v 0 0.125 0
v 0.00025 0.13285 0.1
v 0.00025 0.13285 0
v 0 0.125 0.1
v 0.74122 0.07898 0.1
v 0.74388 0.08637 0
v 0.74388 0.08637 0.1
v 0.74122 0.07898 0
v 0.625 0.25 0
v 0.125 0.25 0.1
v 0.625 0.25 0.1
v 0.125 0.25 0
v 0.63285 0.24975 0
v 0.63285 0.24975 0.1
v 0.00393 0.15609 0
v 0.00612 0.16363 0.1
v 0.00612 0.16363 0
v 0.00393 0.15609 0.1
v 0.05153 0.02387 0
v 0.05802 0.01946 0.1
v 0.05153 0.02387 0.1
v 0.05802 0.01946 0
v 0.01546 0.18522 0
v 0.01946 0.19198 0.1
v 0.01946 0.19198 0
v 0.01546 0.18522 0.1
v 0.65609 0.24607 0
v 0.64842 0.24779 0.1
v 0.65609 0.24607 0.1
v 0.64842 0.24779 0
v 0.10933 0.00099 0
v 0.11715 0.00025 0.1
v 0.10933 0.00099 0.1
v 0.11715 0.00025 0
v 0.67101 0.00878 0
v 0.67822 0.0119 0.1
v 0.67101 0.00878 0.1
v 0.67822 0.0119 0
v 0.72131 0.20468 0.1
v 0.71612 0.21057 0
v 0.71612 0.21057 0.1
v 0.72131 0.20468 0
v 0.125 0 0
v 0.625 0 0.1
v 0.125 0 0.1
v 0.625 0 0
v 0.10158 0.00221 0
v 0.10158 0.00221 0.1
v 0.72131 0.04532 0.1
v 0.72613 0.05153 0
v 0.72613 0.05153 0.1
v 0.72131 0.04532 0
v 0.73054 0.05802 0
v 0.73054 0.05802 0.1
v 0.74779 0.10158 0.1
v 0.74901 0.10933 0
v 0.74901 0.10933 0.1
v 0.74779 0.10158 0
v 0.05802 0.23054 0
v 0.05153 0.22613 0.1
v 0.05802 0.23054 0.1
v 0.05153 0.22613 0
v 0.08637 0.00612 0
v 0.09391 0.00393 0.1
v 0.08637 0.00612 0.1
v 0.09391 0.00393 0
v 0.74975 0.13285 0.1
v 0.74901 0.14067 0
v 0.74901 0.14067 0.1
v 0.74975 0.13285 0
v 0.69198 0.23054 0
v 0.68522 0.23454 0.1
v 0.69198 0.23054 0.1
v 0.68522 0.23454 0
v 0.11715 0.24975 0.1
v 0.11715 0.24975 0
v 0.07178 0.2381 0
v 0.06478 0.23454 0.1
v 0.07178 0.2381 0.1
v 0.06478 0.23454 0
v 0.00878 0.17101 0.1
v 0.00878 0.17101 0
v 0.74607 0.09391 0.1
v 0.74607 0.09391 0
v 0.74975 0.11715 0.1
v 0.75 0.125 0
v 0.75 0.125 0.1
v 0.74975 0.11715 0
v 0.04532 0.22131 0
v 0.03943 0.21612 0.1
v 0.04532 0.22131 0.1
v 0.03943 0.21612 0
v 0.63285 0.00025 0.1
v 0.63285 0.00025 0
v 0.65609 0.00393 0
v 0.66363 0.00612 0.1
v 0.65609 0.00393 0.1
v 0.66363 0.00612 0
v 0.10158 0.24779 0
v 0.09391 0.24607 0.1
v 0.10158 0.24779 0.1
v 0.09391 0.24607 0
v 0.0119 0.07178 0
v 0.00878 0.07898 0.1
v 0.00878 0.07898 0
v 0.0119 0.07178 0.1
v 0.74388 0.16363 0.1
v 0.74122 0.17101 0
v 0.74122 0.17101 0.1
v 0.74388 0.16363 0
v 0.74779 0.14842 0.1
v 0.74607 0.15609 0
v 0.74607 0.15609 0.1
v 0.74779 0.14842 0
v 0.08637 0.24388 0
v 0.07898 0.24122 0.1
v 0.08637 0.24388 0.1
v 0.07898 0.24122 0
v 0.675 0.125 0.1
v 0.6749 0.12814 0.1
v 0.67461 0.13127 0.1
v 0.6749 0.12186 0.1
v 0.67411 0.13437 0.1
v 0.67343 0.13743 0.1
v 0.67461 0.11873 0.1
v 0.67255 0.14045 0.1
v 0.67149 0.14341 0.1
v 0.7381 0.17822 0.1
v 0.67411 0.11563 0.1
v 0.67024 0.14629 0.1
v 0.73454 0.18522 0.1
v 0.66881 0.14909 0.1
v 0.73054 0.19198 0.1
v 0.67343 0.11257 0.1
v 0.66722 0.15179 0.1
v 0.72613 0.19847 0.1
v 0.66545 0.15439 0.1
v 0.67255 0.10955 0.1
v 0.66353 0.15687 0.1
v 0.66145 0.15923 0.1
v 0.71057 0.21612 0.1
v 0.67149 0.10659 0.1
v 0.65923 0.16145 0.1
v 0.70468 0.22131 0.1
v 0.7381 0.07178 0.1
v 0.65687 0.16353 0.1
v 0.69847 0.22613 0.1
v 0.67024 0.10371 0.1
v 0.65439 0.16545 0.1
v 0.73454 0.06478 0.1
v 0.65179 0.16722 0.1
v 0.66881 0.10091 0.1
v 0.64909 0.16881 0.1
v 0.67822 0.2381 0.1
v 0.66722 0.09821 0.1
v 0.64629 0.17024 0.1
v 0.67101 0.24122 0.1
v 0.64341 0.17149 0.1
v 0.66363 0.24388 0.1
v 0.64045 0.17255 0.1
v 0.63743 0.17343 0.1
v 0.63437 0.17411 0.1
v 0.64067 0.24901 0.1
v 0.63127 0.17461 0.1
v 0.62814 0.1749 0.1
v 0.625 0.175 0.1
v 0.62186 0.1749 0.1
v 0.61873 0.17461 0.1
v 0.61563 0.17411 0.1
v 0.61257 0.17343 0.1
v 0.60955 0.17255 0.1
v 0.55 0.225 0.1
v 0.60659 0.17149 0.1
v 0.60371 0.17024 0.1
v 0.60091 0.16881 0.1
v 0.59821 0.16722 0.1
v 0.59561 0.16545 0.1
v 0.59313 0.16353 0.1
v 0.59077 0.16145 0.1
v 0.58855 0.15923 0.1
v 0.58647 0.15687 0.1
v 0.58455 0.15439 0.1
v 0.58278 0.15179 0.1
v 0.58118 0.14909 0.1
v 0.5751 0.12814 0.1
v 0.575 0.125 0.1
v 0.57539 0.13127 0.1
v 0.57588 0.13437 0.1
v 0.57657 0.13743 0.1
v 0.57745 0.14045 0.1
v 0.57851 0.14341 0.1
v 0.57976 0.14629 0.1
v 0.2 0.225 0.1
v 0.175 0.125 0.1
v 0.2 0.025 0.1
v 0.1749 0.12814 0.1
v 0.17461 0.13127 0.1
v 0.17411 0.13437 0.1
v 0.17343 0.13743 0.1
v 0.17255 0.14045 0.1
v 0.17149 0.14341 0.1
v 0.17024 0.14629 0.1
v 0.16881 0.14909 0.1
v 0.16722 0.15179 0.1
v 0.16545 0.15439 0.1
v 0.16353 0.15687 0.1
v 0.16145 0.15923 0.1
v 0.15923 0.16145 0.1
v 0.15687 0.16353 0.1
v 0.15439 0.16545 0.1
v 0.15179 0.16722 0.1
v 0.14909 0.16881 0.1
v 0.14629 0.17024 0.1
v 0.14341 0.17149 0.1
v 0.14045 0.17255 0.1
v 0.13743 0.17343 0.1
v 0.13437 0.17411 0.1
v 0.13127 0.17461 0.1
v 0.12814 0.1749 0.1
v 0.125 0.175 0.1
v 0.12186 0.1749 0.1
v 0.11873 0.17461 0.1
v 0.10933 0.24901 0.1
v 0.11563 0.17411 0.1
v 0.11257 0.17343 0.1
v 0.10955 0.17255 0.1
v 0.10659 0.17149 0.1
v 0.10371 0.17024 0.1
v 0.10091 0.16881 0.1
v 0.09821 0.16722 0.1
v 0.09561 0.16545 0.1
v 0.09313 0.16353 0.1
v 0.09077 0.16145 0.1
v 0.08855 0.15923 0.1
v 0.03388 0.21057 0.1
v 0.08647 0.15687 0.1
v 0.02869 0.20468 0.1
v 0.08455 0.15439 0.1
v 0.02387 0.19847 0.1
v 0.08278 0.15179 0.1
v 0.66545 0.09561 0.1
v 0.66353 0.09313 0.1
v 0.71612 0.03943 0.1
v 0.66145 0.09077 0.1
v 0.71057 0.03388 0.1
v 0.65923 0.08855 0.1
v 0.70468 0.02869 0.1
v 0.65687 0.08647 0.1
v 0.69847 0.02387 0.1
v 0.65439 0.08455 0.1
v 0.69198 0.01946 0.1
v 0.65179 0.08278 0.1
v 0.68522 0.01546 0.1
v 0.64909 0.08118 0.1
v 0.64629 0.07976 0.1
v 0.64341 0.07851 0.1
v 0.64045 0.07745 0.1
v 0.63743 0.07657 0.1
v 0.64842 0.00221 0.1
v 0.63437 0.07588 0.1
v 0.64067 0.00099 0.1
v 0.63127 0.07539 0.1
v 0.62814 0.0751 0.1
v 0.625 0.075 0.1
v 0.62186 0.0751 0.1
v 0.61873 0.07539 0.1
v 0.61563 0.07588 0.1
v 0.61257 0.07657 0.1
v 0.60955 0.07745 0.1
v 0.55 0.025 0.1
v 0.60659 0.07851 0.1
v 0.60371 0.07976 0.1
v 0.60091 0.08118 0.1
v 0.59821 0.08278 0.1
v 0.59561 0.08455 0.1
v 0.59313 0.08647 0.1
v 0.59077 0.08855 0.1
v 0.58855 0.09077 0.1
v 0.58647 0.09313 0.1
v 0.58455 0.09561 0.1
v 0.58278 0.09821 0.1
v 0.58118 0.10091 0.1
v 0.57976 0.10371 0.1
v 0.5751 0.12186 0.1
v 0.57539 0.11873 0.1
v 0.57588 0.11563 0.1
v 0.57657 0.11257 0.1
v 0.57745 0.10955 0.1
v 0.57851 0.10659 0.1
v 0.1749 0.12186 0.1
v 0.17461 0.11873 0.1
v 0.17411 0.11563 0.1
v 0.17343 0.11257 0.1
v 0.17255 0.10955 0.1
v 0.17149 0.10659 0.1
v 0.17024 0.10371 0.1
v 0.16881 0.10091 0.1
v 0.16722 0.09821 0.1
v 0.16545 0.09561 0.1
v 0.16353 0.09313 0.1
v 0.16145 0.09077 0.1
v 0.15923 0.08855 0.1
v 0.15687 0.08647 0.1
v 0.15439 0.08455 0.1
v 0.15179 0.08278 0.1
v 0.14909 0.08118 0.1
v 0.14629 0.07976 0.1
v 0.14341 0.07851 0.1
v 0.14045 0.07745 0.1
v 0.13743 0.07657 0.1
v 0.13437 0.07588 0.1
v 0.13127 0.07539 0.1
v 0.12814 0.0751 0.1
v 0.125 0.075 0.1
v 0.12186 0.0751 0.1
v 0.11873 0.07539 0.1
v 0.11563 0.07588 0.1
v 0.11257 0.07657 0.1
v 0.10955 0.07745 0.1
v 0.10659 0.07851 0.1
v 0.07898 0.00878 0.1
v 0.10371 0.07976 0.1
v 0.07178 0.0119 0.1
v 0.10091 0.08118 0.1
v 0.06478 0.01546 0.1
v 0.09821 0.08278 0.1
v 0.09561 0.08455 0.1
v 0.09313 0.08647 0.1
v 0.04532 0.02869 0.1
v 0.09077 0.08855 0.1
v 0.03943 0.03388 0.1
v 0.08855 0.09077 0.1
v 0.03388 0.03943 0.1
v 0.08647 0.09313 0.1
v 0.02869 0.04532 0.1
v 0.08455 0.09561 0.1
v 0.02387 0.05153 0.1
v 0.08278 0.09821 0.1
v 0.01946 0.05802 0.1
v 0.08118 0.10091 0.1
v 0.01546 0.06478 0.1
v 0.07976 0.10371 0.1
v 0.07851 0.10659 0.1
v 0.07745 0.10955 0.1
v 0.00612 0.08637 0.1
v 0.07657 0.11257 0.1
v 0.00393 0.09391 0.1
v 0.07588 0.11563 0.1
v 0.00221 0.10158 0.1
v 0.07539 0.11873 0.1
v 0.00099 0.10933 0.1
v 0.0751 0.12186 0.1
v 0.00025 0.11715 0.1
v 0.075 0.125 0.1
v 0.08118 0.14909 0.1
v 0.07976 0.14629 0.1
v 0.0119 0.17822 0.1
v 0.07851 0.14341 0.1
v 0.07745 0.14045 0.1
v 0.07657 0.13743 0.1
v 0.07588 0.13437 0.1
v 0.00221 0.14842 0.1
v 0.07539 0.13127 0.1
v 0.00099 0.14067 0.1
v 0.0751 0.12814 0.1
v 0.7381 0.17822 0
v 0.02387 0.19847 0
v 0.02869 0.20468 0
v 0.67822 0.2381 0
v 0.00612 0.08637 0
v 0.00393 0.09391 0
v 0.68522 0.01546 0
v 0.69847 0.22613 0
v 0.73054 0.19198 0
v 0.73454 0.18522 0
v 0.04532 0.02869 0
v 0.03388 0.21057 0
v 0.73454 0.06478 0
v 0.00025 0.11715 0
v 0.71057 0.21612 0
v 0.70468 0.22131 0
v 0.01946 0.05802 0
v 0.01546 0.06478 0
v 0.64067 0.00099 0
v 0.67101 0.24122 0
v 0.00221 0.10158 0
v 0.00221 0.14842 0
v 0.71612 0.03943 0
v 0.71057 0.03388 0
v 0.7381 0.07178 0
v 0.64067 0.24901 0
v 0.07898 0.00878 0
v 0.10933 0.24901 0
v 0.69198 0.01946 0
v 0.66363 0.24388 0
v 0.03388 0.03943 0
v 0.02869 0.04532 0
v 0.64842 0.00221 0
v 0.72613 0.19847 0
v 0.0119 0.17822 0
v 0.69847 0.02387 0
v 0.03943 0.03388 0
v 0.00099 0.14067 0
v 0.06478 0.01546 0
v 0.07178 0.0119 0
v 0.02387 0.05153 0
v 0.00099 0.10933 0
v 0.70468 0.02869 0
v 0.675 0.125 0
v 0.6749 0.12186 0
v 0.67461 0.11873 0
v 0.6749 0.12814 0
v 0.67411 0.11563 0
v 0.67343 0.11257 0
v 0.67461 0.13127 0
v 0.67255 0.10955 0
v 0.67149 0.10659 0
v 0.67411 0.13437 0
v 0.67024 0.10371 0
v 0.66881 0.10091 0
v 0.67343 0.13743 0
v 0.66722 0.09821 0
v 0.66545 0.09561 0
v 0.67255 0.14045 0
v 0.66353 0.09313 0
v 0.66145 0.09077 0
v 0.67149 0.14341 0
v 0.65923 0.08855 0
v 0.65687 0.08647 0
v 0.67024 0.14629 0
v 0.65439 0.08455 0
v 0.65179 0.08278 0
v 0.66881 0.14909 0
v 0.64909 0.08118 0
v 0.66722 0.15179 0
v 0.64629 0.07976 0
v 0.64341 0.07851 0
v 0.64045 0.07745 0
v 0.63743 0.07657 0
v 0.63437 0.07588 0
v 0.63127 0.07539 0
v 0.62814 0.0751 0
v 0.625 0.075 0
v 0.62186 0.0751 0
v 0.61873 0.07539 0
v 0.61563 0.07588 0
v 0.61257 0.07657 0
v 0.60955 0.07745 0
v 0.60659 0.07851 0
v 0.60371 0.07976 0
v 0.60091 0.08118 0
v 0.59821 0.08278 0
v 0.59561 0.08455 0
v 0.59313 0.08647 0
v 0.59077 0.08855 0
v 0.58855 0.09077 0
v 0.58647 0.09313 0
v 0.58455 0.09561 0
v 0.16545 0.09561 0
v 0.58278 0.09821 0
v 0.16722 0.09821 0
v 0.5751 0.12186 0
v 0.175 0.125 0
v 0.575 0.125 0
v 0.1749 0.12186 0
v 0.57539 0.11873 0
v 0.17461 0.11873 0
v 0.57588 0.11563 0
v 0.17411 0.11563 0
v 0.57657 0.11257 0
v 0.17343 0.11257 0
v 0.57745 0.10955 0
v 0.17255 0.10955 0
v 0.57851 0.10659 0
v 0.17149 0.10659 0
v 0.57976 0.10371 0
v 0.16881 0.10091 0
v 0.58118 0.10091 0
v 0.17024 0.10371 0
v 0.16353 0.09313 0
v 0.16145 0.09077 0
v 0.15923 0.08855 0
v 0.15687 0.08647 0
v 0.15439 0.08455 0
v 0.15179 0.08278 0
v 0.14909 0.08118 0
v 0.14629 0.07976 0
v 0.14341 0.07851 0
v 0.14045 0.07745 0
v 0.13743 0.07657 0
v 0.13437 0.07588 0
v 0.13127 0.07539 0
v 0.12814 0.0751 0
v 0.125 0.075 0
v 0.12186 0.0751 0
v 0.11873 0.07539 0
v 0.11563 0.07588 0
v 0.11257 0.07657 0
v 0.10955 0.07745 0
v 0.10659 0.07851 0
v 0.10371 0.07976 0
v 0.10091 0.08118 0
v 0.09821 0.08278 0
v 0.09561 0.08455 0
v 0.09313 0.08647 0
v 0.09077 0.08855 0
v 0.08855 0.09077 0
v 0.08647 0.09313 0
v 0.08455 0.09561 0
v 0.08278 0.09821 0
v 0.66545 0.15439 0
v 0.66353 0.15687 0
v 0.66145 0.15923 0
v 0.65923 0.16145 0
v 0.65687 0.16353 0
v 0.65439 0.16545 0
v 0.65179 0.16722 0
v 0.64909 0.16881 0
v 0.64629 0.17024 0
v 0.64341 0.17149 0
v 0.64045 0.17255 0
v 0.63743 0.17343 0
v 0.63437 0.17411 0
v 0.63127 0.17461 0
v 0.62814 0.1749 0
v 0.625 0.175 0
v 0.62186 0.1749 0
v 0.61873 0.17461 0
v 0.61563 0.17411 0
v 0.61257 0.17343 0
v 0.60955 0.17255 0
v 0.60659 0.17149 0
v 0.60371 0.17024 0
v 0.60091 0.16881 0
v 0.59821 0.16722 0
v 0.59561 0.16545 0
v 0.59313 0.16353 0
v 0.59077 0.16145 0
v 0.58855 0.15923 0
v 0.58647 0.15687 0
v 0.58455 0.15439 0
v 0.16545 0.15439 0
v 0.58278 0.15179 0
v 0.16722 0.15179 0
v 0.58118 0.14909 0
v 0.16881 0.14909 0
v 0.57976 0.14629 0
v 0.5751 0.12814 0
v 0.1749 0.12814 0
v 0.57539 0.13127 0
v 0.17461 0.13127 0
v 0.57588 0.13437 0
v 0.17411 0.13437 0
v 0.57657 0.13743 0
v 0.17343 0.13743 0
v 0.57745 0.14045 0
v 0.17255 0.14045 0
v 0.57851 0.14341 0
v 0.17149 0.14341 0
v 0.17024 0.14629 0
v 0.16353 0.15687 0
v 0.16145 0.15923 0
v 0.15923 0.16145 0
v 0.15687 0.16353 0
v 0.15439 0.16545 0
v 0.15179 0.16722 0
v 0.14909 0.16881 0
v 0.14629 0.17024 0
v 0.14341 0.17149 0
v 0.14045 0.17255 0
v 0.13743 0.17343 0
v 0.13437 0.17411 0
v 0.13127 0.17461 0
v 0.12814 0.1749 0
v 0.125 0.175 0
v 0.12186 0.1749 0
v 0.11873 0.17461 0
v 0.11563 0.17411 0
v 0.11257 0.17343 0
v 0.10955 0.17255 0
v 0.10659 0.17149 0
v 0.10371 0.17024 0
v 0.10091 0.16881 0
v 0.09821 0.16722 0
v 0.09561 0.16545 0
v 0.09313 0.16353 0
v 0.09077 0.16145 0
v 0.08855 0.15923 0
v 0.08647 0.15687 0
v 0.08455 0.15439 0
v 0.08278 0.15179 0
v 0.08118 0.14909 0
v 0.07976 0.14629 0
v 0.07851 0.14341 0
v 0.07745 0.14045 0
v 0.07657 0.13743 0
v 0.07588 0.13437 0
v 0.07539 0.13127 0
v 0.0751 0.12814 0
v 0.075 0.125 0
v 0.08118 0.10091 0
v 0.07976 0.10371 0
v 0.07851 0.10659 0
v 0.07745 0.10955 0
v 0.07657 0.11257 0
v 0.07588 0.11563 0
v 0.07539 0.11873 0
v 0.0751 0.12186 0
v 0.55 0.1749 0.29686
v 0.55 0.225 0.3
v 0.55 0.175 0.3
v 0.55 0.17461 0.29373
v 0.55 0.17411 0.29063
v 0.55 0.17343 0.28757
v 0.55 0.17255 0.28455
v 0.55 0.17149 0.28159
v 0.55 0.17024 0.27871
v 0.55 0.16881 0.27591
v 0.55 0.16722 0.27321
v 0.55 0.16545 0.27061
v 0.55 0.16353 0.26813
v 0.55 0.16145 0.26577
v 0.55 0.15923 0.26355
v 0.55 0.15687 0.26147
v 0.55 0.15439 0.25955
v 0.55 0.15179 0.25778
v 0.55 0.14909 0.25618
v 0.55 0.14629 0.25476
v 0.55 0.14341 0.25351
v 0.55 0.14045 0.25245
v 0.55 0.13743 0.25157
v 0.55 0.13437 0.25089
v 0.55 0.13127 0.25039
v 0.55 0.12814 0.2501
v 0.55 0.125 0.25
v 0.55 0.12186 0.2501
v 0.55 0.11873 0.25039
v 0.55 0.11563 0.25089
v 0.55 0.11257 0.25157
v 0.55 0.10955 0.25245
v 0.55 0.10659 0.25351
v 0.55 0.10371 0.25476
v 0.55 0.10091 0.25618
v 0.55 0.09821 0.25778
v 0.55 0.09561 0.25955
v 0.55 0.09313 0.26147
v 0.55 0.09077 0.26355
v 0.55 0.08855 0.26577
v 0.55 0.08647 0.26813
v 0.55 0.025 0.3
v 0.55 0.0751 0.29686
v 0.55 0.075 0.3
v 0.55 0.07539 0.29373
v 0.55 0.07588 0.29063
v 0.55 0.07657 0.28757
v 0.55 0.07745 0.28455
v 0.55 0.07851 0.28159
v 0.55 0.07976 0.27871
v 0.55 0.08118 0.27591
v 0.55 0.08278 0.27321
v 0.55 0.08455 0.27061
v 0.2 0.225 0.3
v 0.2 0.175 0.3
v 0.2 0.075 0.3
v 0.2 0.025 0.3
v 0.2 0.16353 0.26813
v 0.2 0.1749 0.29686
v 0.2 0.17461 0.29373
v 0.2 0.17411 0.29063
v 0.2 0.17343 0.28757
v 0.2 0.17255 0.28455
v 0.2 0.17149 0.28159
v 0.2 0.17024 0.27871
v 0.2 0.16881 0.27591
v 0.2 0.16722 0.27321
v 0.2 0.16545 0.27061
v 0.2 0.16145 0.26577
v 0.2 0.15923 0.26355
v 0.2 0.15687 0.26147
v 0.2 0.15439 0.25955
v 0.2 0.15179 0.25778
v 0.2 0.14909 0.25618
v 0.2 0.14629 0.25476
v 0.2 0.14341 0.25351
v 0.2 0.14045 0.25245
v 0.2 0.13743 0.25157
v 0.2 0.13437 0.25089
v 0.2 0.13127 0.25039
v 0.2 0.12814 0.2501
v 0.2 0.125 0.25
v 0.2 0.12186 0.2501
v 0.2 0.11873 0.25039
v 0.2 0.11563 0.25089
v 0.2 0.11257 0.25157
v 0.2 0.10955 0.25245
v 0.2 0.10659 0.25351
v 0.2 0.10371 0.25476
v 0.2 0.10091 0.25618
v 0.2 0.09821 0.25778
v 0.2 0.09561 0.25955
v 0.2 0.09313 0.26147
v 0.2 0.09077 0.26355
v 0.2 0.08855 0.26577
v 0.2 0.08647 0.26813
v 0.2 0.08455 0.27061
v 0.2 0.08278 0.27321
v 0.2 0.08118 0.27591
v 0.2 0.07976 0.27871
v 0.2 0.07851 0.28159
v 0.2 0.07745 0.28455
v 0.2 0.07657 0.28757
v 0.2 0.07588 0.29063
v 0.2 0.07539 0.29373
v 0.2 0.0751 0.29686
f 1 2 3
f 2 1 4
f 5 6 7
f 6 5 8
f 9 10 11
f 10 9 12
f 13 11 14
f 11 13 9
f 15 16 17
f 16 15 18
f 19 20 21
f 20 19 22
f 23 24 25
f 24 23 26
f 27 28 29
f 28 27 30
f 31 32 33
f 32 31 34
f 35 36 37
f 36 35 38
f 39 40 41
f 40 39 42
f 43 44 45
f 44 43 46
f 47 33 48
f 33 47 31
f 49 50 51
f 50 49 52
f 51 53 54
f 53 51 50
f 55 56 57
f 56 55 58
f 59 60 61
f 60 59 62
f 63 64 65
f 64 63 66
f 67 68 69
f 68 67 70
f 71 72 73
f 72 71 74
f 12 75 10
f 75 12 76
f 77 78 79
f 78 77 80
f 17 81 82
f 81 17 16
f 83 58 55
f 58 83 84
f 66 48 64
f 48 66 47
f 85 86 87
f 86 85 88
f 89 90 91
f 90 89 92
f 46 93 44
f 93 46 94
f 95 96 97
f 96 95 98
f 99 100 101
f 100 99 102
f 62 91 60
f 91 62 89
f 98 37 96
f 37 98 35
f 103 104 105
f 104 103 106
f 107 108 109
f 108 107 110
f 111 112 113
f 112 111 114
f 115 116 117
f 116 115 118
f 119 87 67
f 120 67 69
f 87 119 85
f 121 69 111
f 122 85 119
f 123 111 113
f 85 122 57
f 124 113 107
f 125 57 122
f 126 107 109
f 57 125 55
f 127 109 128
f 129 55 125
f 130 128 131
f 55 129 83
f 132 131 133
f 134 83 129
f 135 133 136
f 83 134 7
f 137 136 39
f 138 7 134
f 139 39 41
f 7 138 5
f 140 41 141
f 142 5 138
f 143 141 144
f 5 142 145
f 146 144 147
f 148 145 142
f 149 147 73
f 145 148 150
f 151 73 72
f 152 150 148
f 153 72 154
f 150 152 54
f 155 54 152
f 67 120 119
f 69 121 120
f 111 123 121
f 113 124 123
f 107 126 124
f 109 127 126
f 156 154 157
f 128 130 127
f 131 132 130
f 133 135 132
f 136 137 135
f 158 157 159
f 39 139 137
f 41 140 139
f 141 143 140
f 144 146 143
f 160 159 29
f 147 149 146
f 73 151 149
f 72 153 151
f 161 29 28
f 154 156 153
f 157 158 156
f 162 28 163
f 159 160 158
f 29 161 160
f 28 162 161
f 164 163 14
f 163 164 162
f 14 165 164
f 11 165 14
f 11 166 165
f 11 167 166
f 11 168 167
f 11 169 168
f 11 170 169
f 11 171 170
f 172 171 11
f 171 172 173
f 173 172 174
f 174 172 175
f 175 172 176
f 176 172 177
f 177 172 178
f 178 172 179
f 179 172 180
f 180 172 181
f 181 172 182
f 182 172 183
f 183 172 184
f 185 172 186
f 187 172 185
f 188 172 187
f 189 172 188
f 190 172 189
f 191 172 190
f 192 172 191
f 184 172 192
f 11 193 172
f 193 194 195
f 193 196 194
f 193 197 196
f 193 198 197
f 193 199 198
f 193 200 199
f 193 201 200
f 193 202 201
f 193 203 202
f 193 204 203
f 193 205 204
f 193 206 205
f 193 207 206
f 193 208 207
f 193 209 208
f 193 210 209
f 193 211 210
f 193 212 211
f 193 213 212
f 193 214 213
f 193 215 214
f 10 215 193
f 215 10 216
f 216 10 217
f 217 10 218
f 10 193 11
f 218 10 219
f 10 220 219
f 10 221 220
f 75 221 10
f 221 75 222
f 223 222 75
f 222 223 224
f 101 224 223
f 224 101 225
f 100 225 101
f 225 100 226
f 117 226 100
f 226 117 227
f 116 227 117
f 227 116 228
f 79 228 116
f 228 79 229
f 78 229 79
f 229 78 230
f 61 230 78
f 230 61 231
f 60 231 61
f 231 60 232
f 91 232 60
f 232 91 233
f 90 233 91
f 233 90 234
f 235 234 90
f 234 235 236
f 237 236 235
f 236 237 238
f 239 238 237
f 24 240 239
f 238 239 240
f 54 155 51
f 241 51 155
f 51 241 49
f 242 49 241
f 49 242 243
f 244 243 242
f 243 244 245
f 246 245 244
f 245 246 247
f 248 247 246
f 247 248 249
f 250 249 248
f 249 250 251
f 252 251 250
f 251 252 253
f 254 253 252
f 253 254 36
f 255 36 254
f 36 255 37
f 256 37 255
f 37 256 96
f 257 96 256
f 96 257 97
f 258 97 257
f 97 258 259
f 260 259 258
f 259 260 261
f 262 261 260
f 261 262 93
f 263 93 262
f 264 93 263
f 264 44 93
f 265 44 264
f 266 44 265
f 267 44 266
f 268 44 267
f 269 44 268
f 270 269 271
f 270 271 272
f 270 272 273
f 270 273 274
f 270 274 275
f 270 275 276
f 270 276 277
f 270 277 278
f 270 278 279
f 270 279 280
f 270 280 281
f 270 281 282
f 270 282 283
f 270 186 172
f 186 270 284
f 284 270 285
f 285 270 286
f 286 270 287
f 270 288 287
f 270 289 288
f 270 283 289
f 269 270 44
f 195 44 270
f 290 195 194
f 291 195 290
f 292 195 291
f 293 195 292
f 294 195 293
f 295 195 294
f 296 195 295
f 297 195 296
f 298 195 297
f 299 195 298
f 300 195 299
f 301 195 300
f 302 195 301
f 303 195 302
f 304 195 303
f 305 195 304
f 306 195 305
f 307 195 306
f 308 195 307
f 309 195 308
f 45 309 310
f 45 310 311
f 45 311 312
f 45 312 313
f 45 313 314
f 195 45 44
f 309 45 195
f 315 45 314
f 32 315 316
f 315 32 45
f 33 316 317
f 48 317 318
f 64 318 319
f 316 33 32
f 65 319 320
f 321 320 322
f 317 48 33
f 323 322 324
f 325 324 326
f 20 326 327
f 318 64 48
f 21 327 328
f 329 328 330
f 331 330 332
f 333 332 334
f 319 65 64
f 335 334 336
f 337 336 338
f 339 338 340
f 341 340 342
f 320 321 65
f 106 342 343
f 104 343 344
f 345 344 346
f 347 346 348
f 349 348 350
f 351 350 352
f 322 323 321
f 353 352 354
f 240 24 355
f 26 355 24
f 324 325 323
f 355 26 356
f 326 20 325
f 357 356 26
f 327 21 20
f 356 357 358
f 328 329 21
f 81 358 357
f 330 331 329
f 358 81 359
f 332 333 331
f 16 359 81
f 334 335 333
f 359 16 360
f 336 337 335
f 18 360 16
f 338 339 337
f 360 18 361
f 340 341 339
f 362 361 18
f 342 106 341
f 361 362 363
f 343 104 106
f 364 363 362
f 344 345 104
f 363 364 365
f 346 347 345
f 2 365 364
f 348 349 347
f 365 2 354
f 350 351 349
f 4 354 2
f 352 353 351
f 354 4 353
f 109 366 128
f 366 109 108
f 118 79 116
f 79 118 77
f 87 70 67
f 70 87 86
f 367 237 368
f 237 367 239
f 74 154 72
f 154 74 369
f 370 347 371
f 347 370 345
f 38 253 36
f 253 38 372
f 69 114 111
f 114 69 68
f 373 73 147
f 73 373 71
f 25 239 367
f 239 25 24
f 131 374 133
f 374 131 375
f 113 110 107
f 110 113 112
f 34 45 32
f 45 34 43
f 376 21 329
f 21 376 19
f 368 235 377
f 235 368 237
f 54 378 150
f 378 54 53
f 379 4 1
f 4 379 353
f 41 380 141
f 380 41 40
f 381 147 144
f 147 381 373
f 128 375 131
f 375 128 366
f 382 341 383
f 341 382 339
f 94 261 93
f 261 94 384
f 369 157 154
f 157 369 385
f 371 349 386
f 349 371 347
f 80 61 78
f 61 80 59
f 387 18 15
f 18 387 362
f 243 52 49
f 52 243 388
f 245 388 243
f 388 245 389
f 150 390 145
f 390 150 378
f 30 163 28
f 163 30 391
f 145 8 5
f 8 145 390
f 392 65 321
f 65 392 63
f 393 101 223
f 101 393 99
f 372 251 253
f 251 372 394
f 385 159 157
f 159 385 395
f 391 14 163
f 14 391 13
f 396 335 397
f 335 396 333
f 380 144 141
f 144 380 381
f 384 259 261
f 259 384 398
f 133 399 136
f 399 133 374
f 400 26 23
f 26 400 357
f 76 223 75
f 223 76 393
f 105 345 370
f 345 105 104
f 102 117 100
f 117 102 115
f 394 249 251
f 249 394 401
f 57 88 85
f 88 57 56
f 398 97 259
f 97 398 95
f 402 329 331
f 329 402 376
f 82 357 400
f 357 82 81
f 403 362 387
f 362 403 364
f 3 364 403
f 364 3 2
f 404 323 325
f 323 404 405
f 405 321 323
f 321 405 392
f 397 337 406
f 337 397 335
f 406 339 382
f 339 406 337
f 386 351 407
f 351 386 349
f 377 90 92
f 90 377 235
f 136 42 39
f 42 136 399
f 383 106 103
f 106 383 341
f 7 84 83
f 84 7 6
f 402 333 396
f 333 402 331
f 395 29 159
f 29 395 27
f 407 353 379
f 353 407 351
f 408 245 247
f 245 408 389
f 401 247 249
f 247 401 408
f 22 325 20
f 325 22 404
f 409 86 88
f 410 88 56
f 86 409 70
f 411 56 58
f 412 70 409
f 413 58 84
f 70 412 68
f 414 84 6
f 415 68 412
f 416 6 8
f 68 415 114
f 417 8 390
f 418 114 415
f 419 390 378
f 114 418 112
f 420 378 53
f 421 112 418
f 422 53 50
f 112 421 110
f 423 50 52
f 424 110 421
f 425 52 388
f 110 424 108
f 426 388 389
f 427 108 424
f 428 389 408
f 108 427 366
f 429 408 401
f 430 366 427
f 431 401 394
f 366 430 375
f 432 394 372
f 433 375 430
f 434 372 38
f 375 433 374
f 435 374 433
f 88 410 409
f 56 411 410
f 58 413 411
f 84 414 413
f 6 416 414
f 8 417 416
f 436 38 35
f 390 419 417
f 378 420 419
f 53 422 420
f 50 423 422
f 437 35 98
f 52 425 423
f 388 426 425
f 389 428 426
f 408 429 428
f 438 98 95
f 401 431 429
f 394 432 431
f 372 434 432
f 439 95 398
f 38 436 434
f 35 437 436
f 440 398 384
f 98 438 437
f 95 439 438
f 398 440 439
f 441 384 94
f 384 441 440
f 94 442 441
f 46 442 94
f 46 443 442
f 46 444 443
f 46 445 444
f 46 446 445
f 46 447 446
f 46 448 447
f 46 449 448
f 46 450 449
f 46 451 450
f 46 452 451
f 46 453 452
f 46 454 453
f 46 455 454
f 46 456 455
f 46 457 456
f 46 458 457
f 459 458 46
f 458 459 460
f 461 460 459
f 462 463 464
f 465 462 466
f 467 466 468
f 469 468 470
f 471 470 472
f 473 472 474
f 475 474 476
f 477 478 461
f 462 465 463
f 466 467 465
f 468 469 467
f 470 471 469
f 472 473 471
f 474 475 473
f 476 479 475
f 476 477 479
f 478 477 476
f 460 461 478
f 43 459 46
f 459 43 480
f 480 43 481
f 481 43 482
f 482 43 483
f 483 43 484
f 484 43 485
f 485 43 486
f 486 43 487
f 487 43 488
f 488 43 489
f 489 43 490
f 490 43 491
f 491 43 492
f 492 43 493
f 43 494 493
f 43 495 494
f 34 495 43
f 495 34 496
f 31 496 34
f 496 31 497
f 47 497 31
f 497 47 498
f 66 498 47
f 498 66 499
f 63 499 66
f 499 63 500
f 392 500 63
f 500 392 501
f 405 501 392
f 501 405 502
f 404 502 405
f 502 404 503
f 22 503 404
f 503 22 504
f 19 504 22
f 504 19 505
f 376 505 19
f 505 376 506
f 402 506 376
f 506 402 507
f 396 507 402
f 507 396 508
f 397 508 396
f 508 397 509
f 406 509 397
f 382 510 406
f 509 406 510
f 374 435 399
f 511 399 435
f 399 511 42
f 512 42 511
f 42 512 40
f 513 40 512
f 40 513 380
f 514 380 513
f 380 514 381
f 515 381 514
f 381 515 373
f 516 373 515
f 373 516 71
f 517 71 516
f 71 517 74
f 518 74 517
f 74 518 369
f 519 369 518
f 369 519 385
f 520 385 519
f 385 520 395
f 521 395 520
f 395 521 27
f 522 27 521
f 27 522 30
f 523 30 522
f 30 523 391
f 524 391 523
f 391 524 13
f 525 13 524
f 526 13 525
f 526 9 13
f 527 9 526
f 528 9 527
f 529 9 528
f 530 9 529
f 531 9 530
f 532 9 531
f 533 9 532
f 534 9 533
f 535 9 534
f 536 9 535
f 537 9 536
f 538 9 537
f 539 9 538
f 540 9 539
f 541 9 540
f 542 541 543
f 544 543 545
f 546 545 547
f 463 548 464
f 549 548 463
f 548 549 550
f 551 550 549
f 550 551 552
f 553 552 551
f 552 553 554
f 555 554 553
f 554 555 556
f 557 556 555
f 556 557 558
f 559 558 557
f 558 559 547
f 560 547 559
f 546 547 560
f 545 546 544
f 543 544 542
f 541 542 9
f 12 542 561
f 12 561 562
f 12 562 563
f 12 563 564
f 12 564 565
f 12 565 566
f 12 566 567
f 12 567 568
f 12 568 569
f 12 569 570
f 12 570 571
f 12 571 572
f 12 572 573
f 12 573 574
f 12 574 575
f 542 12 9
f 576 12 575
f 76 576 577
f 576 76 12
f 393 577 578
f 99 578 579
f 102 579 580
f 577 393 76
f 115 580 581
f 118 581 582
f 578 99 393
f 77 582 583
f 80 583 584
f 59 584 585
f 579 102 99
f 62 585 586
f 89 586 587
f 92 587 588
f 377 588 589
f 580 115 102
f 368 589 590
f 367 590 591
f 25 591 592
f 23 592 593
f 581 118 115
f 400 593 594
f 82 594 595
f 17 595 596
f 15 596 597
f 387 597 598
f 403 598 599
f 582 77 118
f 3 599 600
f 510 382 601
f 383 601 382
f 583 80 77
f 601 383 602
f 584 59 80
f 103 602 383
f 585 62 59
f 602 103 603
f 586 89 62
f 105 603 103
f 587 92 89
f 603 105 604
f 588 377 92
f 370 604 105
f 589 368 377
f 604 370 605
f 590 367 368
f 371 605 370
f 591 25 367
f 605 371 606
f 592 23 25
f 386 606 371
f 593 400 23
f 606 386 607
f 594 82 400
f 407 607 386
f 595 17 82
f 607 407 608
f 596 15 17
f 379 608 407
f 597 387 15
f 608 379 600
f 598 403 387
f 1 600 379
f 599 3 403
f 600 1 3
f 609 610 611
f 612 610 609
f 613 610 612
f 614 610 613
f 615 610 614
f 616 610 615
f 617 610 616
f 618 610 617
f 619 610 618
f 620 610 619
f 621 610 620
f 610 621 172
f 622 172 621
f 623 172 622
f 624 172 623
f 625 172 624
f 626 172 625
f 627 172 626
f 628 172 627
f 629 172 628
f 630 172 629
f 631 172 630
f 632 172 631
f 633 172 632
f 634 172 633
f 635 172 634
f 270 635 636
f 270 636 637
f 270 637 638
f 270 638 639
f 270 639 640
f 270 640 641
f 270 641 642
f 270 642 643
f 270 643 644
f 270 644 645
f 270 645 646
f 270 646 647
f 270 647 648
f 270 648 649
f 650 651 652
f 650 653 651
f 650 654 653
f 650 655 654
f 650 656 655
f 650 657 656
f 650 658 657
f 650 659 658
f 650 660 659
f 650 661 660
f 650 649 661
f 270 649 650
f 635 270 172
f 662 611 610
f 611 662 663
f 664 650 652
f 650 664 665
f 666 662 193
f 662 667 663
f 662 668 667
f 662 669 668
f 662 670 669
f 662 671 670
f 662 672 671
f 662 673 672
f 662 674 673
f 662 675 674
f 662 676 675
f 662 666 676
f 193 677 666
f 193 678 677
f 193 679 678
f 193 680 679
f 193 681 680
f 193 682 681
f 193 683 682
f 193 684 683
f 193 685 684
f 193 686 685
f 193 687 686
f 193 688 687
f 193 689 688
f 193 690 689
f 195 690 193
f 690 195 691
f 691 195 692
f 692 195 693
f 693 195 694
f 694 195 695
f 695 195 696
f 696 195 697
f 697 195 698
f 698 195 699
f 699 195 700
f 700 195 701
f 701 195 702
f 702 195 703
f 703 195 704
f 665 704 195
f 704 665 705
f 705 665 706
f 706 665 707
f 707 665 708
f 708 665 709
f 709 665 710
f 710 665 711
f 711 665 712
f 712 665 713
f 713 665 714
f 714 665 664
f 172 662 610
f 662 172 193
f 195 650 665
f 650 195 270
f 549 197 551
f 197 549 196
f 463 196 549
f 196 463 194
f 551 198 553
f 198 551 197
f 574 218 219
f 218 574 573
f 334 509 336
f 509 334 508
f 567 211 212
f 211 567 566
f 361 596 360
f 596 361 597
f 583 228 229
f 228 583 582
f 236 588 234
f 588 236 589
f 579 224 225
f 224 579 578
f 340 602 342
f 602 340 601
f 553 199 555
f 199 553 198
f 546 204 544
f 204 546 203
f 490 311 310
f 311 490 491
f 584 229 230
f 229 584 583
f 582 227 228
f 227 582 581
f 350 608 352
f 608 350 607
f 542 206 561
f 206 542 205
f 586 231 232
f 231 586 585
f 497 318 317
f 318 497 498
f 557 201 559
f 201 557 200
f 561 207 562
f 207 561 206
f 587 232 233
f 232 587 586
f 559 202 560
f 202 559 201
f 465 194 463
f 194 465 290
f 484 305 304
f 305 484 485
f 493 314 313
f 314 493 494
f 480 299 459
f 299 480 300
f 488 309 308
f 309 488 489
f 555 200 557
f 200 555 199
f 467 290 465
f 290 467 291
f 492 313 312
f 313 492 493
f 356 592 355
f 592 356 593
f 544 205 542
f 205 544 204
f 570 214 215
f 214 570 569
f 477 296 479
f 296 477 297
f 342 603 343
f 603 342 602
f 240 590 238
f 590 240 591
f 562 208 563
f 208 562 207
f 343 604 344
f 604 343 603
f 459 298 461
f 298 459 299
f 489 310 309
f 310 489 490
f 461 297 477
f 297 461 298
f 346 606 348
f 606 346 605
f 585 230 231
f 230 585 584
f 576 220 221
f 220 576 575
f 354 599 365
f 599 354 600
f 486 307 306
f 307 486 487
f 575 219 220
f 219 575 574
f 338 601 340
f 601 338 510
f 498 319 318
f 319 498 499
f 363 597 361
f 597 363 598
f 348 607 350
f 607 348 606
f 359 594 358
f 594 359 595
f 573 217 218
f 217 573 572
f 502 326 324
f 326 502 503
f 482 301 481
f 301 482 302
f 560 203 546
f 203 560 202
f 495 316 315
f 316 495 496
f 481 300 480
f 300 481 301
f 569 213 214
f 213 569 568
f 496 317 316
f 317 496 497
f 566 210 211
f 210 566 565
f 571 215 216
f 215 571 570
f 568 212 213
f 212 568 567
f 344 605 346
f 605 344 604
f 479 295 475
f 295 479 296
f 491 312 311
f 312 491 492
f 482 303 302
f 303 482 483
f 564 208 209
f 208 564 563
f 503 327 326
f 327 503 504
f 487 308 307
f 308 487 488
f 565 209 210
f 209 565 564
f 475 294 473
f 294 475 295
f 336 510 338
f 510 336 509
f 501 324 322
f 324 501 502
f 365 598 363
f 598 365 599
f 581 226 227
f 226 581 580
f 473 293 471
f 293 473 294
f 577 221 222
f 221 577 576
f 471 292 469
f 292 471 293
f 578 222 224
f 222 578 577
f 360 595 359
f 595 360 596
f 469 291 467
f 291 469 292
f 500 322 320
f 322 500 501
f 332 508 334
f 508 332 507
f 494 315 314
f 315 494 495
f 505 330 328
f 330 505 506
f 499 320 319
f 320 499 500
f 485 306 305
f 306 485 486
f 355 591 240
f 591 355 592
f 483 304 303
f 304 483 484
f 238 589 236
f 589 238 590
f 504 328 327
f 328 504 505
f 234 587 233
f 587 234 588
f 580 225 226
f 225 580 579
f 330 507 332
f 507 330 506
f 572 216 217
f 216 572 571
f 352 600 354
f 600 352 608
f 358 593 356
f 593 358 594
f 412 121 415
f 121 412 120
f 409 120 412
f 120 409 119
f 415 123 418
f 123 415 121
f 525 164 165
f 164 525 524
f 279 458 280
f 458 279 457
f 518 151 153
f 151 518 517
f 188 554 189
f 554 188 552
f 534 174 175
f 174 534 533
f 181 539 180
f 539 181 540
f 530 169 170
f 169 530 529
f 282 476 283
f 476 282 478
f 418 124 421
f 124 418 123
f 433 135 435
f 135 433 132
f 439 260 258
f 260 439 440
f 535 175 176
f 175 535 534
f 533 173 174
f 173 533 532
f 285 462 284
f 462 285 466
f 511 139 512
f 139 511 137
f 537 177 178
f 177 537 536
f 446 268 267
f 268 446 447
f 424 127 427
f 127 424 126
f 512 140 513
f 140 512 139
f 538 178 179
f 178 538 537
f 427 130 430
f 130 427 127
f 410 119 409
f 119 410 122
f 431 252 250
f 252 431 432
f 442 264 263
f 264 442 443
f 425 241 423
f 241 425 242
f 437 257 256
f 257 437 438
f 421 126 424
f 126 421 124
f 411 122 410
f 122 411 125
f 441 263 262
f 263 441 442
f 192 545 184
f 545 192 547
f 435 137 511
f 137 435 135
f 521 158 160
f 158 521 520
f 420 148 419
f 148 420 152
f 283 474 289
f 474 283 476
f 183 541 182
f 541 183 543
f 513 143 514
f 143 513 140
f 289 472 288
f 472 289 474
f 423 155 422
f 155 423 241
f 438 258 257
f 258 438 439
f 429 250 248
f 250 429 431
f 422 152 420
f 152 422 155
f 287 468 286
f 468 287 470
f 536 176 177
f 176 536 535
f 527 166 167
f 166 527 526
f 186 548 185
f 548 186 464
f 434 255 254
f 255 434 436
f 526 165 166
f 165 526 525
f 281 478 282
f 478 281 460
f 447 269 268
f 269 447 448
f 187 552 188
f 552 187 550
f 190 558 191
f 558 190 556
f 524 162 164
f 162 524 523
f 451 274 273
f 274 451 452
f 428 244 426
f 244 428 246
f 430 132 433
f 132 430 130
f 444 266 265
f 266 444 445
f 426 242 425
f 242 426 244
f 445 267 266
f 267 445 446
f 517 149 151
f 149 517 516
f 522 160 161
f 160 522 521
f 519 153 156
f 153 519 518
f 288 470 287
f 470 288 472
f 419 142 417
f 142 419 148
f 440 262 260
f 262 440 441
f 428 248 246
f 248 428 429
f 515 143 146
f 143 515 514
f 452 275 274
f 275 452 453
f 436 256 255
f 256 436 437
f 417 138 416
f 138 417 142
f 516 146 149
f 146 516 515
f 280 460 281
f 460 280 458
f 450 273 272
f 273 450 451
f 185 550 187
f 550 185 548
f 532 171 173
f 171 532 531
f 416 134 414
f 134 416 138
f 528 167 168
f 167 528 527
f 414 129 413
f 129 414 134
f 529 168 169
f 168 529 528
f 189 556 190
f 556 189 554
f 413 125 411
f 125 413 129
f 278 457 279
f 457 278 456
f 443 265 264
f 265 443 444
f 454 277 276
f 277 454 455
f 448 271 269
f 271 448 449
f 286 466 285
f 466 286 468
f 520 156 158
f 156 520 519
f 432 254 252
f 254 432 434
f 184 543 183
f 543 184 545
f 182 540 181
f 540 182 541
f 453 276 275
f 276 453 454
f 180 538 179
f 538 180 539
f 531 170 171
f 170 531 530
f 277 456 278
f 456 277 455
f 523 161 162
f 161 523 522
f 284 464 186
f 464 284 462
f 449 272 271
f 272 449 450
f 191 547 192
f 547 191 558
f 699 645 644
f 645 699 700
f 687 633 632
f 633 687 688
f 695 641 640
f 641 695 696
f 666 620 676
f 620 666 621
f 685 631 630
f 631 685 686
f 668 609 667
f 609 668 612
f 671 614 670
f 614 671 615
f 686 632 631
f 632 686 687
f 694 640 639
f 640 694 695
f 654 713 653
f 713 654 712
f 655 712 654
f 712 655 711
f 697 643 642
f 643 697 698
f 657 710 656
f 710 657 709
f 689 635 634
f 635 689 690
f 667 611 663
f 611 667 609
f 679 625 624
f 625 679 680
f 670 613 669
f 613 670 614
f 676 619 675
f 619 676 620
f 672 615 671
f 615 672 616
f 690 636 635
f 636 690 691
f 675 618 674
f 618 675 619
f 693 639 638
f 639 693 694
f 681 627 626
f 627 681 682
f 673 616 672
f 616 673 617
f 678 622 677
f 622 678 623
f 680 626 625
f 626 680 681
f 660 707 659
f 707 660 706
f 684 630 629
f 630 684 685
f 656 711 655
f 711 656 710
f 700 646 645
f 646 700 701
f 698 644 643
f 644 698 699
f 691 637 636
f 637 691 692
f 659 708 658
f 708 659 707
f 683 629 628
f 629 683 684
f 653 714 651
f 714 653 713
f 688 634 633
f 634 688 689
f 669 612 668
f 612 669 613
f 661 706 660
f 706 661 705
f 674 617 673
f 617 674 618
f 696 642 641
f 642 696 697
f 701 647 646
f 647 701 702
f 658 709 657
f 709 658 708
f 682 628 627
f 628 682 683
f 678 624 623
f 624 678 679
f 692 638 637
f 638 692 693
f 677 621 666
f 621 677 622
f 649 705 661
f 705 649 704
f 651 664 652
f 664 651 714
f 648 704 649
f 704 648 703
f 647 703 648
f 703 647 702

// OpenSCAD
// === Main Base Obround Slab Parameters ===
base_length = 0.75;
base_width = 0.25;
base_height = 0.1;

// === Through-Hole Parameters ===
hole_radius = 0.05;
hole_y = 0.125;           // from front edge
hole_x1 = 0.125;          // first hole from left edge
hole_x2 = 0.625;          // second hole from left edge

// === Lower Upright Parameters ===
upright_length = 0.35;
upright_width = 0.2;
upright_height = 0.2;
upright_x_offset = 0.2;   // from both length ends
upright_y_offset = 0.025; // from both front/back edges

// === Rounded Cap Parameters ===
cap_radius = 0.1;          // semicircular profile radius (width/2)
cap_rise = 0.1;            // rise above upright top
crown_height = 0.4;        // crown above base underside

// === Horizontal Passage Parameters ===
passage_radius = 0.05;
passage_y = 0.125;         // center from front edge
passage_z_min = 0.25;
passage_z_max = 0.35;
passage_x_start = 0.2;     // starts at upright left face
passage_reach = 0.444;     // reach along length direction

// === Upper Relief Parameters ===
relief_length = 0.24;
relief_x_clearance = 0.255; // clearance to both base ends
relief_y_reach = 0.299;     // transverse reach from front position
relief_y_start = 0.025;     // front position from base front
relief_z_min = 0.18;
relief_z_max = 0.45;

// === Resolution ===
$fn = 100;

// === Derived Dimensions ===
obround_radius = base_width / 2;
upright_x1 = upright_x_offset;
upright_x2 = base_length - upright_x_offset;
upright_y1 = upright_y_offset;
upright_y2 = base_width - upright_y_offset;
upright_z_top = base_height + upright_height;
passage_z_center = (passage_z_min + passage_z_max) / 2;
passage_length = passage_reach + 1;
relief_x1 = relief_x_clearance;
relief_x2 = base_length - relief_x_clearance;
relief_y_end = relief_y_start + relief_y_reach;
relief_z_center = (relief_z_min + relief_z_max) / 2;
relief_radius = relief_y_reach / 2;

// === Main Assembly ===
difference() {
    union() {
        // 1. Main obround base slab
        obround_base();

        // 2. Lower upright
        translate([upright_x1, upright_y1, base_height])
            cube([upright_length, upright_width, upright_height]);

        // 3. Rounded cap over upright
        translate([upright_x1, 0, upright_z_top])
            rounded_cap(upright_length, upright_y1, upright_y2, cap_radius);
    }

    // 4. Two vertical through-holes in base
    translate([hole_x1, hole_y, -0.5])
        cylinder(h = base_height + 1, r = hole_radius);
    translate([hole_x2, hole_y, -0.5])
        cylinder(h = base_height + 1, r = hole_radius);

    // 5. Horizontal circular through-passage in upright
    translate([-0.5, passage_y, passage_z_center])
        rotate([0, 90, 0])
            cylinder(h = passage_length, r = passage_radius);

    // 6. Rounded upper relief from front side
    translate([relief_x1, 0, 0])
        linear_extrude(height = relief_length)
            relief_profile(relief_y_start, relief_z_center, relief_radius);
}

// === Module: Obround Base ===
module obround_base() {
    linear_extrude(height = base_height)
        hull() {
            translate([obround_radius, obround_radius])
                circle(r = obround_radius);
            translate([base_length - obround_radius, obround_radius])
                circle(r = obround_radius);
        }
}

// === Module: Rounded Cap (semicircular profile extruded along length) ===
module rounded_cap(length, y1, y2, r) {
    y_center = (y1 + y2) / 2;
    translate([0, y_center, 0])
        rotate([0, 90, 0])
            linear_extrude(height = length)
                intersection() {
                    translate([0, -y_center])
                        square([r, base_width]);
                    circle(r = r);
                }
}

// === Module: Relief Profile (semicircle for front-side cut) ===
module relief_profile(y_start, z_center, r) {
    translate([y_start + r, z_center])
        intersection() {
            translate([-r - r, -r])
                square([r, 2 * r]);
            circle(r = r);
        }
}
